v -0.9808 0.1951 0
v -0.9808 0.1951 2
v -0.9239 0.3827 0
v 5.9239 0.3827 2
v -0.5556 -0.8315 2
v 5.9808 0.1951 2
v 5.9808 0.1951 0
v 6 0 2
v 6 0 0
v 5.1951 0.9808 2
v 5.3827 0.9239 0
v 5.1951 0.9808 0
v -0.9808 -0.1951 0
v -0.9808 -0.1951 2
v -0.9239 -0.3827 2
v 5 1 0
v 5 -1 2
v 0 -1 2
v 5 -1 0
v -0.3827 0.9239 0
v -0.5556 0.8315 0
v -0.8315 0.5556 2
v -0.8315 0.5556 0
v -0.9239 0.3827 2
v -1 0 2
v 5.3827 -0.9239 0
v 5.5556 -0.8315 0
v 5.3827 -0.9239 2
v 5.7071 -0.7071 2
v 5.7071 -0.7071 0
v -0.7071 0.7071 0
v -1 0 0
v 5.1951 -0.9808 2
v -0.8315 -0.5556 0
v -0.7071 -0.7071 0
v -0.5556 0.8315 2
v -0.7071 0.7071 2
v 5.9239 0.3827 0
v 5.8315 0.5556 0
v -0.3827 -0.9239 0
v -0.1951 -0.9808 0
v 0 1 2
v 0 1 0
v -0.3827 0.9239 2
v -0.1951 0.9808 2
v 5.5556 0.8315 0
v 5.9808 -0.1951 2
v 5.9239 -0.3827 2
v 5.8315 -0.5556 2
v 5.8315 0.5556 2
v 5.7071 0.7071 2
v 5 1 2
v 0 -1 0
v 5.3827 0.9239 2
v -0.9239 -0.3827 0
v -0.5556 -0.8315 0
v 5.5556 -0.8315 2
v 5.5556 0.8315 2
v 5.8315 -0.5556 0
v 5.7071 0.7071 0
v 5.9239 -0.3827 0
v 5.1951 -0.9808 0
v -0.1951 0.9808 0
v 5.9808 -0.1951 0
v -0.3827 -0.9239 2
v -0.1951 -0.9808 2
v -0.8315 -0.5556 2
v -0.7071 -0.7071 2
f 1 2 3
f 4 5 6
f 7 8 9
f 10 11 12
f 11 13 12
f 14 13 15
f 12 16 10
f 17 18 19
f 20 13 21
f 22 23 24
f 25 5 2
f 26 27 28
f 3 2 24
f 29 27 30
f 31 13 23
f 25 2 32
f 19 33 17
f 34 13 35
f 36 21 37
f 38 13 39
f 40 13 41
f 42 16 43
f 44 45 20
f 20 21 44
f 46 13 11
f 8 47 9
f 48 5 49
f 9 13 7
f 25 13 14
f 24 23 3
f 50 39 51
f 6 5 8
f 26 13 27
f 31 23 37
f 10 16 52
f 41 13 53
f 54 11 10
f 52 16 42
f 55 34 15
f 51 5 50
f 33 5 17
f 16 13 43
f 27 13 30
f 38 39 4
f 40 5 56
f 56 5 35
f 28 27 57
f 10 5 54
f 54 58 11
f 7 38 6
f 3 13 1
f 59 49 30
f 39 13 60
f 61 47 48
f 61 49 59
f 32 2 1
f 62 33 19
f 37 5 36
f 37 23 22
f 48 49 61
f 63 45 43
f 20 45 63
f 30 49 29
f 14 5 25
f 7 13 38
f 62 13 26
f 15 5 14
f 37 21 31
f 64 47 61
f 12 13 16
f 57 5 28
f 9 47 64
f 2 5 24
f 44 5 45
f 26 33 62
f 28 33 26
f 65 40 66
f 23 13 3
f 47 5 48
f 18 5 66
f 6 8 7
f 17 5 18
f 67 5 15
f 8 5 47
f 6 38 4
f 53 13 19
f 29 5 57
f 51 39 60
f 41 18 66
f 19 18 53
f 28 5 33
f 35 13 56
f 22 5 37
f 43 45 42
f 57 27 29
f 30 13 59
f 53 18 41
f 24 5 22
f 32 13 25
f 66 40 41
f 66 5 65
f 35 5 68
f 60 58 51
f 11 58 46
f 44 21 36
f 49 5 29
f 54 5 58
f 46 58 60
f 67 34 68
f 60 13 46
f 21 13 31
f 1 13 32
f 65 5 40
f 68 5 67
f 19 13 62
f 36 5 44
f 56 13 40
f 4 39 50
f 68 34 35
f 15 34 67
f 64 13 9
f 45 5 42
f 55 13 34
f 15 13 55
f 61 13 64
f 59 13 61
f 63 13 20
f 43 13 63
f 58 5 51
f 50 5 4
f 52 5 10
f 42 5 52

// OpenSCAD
$fn = 32;
hull() {
  cylinder(h = 2, r = 1);
  translate([5, 0, 0]) cylinder(h = 2, r = 1);
}
